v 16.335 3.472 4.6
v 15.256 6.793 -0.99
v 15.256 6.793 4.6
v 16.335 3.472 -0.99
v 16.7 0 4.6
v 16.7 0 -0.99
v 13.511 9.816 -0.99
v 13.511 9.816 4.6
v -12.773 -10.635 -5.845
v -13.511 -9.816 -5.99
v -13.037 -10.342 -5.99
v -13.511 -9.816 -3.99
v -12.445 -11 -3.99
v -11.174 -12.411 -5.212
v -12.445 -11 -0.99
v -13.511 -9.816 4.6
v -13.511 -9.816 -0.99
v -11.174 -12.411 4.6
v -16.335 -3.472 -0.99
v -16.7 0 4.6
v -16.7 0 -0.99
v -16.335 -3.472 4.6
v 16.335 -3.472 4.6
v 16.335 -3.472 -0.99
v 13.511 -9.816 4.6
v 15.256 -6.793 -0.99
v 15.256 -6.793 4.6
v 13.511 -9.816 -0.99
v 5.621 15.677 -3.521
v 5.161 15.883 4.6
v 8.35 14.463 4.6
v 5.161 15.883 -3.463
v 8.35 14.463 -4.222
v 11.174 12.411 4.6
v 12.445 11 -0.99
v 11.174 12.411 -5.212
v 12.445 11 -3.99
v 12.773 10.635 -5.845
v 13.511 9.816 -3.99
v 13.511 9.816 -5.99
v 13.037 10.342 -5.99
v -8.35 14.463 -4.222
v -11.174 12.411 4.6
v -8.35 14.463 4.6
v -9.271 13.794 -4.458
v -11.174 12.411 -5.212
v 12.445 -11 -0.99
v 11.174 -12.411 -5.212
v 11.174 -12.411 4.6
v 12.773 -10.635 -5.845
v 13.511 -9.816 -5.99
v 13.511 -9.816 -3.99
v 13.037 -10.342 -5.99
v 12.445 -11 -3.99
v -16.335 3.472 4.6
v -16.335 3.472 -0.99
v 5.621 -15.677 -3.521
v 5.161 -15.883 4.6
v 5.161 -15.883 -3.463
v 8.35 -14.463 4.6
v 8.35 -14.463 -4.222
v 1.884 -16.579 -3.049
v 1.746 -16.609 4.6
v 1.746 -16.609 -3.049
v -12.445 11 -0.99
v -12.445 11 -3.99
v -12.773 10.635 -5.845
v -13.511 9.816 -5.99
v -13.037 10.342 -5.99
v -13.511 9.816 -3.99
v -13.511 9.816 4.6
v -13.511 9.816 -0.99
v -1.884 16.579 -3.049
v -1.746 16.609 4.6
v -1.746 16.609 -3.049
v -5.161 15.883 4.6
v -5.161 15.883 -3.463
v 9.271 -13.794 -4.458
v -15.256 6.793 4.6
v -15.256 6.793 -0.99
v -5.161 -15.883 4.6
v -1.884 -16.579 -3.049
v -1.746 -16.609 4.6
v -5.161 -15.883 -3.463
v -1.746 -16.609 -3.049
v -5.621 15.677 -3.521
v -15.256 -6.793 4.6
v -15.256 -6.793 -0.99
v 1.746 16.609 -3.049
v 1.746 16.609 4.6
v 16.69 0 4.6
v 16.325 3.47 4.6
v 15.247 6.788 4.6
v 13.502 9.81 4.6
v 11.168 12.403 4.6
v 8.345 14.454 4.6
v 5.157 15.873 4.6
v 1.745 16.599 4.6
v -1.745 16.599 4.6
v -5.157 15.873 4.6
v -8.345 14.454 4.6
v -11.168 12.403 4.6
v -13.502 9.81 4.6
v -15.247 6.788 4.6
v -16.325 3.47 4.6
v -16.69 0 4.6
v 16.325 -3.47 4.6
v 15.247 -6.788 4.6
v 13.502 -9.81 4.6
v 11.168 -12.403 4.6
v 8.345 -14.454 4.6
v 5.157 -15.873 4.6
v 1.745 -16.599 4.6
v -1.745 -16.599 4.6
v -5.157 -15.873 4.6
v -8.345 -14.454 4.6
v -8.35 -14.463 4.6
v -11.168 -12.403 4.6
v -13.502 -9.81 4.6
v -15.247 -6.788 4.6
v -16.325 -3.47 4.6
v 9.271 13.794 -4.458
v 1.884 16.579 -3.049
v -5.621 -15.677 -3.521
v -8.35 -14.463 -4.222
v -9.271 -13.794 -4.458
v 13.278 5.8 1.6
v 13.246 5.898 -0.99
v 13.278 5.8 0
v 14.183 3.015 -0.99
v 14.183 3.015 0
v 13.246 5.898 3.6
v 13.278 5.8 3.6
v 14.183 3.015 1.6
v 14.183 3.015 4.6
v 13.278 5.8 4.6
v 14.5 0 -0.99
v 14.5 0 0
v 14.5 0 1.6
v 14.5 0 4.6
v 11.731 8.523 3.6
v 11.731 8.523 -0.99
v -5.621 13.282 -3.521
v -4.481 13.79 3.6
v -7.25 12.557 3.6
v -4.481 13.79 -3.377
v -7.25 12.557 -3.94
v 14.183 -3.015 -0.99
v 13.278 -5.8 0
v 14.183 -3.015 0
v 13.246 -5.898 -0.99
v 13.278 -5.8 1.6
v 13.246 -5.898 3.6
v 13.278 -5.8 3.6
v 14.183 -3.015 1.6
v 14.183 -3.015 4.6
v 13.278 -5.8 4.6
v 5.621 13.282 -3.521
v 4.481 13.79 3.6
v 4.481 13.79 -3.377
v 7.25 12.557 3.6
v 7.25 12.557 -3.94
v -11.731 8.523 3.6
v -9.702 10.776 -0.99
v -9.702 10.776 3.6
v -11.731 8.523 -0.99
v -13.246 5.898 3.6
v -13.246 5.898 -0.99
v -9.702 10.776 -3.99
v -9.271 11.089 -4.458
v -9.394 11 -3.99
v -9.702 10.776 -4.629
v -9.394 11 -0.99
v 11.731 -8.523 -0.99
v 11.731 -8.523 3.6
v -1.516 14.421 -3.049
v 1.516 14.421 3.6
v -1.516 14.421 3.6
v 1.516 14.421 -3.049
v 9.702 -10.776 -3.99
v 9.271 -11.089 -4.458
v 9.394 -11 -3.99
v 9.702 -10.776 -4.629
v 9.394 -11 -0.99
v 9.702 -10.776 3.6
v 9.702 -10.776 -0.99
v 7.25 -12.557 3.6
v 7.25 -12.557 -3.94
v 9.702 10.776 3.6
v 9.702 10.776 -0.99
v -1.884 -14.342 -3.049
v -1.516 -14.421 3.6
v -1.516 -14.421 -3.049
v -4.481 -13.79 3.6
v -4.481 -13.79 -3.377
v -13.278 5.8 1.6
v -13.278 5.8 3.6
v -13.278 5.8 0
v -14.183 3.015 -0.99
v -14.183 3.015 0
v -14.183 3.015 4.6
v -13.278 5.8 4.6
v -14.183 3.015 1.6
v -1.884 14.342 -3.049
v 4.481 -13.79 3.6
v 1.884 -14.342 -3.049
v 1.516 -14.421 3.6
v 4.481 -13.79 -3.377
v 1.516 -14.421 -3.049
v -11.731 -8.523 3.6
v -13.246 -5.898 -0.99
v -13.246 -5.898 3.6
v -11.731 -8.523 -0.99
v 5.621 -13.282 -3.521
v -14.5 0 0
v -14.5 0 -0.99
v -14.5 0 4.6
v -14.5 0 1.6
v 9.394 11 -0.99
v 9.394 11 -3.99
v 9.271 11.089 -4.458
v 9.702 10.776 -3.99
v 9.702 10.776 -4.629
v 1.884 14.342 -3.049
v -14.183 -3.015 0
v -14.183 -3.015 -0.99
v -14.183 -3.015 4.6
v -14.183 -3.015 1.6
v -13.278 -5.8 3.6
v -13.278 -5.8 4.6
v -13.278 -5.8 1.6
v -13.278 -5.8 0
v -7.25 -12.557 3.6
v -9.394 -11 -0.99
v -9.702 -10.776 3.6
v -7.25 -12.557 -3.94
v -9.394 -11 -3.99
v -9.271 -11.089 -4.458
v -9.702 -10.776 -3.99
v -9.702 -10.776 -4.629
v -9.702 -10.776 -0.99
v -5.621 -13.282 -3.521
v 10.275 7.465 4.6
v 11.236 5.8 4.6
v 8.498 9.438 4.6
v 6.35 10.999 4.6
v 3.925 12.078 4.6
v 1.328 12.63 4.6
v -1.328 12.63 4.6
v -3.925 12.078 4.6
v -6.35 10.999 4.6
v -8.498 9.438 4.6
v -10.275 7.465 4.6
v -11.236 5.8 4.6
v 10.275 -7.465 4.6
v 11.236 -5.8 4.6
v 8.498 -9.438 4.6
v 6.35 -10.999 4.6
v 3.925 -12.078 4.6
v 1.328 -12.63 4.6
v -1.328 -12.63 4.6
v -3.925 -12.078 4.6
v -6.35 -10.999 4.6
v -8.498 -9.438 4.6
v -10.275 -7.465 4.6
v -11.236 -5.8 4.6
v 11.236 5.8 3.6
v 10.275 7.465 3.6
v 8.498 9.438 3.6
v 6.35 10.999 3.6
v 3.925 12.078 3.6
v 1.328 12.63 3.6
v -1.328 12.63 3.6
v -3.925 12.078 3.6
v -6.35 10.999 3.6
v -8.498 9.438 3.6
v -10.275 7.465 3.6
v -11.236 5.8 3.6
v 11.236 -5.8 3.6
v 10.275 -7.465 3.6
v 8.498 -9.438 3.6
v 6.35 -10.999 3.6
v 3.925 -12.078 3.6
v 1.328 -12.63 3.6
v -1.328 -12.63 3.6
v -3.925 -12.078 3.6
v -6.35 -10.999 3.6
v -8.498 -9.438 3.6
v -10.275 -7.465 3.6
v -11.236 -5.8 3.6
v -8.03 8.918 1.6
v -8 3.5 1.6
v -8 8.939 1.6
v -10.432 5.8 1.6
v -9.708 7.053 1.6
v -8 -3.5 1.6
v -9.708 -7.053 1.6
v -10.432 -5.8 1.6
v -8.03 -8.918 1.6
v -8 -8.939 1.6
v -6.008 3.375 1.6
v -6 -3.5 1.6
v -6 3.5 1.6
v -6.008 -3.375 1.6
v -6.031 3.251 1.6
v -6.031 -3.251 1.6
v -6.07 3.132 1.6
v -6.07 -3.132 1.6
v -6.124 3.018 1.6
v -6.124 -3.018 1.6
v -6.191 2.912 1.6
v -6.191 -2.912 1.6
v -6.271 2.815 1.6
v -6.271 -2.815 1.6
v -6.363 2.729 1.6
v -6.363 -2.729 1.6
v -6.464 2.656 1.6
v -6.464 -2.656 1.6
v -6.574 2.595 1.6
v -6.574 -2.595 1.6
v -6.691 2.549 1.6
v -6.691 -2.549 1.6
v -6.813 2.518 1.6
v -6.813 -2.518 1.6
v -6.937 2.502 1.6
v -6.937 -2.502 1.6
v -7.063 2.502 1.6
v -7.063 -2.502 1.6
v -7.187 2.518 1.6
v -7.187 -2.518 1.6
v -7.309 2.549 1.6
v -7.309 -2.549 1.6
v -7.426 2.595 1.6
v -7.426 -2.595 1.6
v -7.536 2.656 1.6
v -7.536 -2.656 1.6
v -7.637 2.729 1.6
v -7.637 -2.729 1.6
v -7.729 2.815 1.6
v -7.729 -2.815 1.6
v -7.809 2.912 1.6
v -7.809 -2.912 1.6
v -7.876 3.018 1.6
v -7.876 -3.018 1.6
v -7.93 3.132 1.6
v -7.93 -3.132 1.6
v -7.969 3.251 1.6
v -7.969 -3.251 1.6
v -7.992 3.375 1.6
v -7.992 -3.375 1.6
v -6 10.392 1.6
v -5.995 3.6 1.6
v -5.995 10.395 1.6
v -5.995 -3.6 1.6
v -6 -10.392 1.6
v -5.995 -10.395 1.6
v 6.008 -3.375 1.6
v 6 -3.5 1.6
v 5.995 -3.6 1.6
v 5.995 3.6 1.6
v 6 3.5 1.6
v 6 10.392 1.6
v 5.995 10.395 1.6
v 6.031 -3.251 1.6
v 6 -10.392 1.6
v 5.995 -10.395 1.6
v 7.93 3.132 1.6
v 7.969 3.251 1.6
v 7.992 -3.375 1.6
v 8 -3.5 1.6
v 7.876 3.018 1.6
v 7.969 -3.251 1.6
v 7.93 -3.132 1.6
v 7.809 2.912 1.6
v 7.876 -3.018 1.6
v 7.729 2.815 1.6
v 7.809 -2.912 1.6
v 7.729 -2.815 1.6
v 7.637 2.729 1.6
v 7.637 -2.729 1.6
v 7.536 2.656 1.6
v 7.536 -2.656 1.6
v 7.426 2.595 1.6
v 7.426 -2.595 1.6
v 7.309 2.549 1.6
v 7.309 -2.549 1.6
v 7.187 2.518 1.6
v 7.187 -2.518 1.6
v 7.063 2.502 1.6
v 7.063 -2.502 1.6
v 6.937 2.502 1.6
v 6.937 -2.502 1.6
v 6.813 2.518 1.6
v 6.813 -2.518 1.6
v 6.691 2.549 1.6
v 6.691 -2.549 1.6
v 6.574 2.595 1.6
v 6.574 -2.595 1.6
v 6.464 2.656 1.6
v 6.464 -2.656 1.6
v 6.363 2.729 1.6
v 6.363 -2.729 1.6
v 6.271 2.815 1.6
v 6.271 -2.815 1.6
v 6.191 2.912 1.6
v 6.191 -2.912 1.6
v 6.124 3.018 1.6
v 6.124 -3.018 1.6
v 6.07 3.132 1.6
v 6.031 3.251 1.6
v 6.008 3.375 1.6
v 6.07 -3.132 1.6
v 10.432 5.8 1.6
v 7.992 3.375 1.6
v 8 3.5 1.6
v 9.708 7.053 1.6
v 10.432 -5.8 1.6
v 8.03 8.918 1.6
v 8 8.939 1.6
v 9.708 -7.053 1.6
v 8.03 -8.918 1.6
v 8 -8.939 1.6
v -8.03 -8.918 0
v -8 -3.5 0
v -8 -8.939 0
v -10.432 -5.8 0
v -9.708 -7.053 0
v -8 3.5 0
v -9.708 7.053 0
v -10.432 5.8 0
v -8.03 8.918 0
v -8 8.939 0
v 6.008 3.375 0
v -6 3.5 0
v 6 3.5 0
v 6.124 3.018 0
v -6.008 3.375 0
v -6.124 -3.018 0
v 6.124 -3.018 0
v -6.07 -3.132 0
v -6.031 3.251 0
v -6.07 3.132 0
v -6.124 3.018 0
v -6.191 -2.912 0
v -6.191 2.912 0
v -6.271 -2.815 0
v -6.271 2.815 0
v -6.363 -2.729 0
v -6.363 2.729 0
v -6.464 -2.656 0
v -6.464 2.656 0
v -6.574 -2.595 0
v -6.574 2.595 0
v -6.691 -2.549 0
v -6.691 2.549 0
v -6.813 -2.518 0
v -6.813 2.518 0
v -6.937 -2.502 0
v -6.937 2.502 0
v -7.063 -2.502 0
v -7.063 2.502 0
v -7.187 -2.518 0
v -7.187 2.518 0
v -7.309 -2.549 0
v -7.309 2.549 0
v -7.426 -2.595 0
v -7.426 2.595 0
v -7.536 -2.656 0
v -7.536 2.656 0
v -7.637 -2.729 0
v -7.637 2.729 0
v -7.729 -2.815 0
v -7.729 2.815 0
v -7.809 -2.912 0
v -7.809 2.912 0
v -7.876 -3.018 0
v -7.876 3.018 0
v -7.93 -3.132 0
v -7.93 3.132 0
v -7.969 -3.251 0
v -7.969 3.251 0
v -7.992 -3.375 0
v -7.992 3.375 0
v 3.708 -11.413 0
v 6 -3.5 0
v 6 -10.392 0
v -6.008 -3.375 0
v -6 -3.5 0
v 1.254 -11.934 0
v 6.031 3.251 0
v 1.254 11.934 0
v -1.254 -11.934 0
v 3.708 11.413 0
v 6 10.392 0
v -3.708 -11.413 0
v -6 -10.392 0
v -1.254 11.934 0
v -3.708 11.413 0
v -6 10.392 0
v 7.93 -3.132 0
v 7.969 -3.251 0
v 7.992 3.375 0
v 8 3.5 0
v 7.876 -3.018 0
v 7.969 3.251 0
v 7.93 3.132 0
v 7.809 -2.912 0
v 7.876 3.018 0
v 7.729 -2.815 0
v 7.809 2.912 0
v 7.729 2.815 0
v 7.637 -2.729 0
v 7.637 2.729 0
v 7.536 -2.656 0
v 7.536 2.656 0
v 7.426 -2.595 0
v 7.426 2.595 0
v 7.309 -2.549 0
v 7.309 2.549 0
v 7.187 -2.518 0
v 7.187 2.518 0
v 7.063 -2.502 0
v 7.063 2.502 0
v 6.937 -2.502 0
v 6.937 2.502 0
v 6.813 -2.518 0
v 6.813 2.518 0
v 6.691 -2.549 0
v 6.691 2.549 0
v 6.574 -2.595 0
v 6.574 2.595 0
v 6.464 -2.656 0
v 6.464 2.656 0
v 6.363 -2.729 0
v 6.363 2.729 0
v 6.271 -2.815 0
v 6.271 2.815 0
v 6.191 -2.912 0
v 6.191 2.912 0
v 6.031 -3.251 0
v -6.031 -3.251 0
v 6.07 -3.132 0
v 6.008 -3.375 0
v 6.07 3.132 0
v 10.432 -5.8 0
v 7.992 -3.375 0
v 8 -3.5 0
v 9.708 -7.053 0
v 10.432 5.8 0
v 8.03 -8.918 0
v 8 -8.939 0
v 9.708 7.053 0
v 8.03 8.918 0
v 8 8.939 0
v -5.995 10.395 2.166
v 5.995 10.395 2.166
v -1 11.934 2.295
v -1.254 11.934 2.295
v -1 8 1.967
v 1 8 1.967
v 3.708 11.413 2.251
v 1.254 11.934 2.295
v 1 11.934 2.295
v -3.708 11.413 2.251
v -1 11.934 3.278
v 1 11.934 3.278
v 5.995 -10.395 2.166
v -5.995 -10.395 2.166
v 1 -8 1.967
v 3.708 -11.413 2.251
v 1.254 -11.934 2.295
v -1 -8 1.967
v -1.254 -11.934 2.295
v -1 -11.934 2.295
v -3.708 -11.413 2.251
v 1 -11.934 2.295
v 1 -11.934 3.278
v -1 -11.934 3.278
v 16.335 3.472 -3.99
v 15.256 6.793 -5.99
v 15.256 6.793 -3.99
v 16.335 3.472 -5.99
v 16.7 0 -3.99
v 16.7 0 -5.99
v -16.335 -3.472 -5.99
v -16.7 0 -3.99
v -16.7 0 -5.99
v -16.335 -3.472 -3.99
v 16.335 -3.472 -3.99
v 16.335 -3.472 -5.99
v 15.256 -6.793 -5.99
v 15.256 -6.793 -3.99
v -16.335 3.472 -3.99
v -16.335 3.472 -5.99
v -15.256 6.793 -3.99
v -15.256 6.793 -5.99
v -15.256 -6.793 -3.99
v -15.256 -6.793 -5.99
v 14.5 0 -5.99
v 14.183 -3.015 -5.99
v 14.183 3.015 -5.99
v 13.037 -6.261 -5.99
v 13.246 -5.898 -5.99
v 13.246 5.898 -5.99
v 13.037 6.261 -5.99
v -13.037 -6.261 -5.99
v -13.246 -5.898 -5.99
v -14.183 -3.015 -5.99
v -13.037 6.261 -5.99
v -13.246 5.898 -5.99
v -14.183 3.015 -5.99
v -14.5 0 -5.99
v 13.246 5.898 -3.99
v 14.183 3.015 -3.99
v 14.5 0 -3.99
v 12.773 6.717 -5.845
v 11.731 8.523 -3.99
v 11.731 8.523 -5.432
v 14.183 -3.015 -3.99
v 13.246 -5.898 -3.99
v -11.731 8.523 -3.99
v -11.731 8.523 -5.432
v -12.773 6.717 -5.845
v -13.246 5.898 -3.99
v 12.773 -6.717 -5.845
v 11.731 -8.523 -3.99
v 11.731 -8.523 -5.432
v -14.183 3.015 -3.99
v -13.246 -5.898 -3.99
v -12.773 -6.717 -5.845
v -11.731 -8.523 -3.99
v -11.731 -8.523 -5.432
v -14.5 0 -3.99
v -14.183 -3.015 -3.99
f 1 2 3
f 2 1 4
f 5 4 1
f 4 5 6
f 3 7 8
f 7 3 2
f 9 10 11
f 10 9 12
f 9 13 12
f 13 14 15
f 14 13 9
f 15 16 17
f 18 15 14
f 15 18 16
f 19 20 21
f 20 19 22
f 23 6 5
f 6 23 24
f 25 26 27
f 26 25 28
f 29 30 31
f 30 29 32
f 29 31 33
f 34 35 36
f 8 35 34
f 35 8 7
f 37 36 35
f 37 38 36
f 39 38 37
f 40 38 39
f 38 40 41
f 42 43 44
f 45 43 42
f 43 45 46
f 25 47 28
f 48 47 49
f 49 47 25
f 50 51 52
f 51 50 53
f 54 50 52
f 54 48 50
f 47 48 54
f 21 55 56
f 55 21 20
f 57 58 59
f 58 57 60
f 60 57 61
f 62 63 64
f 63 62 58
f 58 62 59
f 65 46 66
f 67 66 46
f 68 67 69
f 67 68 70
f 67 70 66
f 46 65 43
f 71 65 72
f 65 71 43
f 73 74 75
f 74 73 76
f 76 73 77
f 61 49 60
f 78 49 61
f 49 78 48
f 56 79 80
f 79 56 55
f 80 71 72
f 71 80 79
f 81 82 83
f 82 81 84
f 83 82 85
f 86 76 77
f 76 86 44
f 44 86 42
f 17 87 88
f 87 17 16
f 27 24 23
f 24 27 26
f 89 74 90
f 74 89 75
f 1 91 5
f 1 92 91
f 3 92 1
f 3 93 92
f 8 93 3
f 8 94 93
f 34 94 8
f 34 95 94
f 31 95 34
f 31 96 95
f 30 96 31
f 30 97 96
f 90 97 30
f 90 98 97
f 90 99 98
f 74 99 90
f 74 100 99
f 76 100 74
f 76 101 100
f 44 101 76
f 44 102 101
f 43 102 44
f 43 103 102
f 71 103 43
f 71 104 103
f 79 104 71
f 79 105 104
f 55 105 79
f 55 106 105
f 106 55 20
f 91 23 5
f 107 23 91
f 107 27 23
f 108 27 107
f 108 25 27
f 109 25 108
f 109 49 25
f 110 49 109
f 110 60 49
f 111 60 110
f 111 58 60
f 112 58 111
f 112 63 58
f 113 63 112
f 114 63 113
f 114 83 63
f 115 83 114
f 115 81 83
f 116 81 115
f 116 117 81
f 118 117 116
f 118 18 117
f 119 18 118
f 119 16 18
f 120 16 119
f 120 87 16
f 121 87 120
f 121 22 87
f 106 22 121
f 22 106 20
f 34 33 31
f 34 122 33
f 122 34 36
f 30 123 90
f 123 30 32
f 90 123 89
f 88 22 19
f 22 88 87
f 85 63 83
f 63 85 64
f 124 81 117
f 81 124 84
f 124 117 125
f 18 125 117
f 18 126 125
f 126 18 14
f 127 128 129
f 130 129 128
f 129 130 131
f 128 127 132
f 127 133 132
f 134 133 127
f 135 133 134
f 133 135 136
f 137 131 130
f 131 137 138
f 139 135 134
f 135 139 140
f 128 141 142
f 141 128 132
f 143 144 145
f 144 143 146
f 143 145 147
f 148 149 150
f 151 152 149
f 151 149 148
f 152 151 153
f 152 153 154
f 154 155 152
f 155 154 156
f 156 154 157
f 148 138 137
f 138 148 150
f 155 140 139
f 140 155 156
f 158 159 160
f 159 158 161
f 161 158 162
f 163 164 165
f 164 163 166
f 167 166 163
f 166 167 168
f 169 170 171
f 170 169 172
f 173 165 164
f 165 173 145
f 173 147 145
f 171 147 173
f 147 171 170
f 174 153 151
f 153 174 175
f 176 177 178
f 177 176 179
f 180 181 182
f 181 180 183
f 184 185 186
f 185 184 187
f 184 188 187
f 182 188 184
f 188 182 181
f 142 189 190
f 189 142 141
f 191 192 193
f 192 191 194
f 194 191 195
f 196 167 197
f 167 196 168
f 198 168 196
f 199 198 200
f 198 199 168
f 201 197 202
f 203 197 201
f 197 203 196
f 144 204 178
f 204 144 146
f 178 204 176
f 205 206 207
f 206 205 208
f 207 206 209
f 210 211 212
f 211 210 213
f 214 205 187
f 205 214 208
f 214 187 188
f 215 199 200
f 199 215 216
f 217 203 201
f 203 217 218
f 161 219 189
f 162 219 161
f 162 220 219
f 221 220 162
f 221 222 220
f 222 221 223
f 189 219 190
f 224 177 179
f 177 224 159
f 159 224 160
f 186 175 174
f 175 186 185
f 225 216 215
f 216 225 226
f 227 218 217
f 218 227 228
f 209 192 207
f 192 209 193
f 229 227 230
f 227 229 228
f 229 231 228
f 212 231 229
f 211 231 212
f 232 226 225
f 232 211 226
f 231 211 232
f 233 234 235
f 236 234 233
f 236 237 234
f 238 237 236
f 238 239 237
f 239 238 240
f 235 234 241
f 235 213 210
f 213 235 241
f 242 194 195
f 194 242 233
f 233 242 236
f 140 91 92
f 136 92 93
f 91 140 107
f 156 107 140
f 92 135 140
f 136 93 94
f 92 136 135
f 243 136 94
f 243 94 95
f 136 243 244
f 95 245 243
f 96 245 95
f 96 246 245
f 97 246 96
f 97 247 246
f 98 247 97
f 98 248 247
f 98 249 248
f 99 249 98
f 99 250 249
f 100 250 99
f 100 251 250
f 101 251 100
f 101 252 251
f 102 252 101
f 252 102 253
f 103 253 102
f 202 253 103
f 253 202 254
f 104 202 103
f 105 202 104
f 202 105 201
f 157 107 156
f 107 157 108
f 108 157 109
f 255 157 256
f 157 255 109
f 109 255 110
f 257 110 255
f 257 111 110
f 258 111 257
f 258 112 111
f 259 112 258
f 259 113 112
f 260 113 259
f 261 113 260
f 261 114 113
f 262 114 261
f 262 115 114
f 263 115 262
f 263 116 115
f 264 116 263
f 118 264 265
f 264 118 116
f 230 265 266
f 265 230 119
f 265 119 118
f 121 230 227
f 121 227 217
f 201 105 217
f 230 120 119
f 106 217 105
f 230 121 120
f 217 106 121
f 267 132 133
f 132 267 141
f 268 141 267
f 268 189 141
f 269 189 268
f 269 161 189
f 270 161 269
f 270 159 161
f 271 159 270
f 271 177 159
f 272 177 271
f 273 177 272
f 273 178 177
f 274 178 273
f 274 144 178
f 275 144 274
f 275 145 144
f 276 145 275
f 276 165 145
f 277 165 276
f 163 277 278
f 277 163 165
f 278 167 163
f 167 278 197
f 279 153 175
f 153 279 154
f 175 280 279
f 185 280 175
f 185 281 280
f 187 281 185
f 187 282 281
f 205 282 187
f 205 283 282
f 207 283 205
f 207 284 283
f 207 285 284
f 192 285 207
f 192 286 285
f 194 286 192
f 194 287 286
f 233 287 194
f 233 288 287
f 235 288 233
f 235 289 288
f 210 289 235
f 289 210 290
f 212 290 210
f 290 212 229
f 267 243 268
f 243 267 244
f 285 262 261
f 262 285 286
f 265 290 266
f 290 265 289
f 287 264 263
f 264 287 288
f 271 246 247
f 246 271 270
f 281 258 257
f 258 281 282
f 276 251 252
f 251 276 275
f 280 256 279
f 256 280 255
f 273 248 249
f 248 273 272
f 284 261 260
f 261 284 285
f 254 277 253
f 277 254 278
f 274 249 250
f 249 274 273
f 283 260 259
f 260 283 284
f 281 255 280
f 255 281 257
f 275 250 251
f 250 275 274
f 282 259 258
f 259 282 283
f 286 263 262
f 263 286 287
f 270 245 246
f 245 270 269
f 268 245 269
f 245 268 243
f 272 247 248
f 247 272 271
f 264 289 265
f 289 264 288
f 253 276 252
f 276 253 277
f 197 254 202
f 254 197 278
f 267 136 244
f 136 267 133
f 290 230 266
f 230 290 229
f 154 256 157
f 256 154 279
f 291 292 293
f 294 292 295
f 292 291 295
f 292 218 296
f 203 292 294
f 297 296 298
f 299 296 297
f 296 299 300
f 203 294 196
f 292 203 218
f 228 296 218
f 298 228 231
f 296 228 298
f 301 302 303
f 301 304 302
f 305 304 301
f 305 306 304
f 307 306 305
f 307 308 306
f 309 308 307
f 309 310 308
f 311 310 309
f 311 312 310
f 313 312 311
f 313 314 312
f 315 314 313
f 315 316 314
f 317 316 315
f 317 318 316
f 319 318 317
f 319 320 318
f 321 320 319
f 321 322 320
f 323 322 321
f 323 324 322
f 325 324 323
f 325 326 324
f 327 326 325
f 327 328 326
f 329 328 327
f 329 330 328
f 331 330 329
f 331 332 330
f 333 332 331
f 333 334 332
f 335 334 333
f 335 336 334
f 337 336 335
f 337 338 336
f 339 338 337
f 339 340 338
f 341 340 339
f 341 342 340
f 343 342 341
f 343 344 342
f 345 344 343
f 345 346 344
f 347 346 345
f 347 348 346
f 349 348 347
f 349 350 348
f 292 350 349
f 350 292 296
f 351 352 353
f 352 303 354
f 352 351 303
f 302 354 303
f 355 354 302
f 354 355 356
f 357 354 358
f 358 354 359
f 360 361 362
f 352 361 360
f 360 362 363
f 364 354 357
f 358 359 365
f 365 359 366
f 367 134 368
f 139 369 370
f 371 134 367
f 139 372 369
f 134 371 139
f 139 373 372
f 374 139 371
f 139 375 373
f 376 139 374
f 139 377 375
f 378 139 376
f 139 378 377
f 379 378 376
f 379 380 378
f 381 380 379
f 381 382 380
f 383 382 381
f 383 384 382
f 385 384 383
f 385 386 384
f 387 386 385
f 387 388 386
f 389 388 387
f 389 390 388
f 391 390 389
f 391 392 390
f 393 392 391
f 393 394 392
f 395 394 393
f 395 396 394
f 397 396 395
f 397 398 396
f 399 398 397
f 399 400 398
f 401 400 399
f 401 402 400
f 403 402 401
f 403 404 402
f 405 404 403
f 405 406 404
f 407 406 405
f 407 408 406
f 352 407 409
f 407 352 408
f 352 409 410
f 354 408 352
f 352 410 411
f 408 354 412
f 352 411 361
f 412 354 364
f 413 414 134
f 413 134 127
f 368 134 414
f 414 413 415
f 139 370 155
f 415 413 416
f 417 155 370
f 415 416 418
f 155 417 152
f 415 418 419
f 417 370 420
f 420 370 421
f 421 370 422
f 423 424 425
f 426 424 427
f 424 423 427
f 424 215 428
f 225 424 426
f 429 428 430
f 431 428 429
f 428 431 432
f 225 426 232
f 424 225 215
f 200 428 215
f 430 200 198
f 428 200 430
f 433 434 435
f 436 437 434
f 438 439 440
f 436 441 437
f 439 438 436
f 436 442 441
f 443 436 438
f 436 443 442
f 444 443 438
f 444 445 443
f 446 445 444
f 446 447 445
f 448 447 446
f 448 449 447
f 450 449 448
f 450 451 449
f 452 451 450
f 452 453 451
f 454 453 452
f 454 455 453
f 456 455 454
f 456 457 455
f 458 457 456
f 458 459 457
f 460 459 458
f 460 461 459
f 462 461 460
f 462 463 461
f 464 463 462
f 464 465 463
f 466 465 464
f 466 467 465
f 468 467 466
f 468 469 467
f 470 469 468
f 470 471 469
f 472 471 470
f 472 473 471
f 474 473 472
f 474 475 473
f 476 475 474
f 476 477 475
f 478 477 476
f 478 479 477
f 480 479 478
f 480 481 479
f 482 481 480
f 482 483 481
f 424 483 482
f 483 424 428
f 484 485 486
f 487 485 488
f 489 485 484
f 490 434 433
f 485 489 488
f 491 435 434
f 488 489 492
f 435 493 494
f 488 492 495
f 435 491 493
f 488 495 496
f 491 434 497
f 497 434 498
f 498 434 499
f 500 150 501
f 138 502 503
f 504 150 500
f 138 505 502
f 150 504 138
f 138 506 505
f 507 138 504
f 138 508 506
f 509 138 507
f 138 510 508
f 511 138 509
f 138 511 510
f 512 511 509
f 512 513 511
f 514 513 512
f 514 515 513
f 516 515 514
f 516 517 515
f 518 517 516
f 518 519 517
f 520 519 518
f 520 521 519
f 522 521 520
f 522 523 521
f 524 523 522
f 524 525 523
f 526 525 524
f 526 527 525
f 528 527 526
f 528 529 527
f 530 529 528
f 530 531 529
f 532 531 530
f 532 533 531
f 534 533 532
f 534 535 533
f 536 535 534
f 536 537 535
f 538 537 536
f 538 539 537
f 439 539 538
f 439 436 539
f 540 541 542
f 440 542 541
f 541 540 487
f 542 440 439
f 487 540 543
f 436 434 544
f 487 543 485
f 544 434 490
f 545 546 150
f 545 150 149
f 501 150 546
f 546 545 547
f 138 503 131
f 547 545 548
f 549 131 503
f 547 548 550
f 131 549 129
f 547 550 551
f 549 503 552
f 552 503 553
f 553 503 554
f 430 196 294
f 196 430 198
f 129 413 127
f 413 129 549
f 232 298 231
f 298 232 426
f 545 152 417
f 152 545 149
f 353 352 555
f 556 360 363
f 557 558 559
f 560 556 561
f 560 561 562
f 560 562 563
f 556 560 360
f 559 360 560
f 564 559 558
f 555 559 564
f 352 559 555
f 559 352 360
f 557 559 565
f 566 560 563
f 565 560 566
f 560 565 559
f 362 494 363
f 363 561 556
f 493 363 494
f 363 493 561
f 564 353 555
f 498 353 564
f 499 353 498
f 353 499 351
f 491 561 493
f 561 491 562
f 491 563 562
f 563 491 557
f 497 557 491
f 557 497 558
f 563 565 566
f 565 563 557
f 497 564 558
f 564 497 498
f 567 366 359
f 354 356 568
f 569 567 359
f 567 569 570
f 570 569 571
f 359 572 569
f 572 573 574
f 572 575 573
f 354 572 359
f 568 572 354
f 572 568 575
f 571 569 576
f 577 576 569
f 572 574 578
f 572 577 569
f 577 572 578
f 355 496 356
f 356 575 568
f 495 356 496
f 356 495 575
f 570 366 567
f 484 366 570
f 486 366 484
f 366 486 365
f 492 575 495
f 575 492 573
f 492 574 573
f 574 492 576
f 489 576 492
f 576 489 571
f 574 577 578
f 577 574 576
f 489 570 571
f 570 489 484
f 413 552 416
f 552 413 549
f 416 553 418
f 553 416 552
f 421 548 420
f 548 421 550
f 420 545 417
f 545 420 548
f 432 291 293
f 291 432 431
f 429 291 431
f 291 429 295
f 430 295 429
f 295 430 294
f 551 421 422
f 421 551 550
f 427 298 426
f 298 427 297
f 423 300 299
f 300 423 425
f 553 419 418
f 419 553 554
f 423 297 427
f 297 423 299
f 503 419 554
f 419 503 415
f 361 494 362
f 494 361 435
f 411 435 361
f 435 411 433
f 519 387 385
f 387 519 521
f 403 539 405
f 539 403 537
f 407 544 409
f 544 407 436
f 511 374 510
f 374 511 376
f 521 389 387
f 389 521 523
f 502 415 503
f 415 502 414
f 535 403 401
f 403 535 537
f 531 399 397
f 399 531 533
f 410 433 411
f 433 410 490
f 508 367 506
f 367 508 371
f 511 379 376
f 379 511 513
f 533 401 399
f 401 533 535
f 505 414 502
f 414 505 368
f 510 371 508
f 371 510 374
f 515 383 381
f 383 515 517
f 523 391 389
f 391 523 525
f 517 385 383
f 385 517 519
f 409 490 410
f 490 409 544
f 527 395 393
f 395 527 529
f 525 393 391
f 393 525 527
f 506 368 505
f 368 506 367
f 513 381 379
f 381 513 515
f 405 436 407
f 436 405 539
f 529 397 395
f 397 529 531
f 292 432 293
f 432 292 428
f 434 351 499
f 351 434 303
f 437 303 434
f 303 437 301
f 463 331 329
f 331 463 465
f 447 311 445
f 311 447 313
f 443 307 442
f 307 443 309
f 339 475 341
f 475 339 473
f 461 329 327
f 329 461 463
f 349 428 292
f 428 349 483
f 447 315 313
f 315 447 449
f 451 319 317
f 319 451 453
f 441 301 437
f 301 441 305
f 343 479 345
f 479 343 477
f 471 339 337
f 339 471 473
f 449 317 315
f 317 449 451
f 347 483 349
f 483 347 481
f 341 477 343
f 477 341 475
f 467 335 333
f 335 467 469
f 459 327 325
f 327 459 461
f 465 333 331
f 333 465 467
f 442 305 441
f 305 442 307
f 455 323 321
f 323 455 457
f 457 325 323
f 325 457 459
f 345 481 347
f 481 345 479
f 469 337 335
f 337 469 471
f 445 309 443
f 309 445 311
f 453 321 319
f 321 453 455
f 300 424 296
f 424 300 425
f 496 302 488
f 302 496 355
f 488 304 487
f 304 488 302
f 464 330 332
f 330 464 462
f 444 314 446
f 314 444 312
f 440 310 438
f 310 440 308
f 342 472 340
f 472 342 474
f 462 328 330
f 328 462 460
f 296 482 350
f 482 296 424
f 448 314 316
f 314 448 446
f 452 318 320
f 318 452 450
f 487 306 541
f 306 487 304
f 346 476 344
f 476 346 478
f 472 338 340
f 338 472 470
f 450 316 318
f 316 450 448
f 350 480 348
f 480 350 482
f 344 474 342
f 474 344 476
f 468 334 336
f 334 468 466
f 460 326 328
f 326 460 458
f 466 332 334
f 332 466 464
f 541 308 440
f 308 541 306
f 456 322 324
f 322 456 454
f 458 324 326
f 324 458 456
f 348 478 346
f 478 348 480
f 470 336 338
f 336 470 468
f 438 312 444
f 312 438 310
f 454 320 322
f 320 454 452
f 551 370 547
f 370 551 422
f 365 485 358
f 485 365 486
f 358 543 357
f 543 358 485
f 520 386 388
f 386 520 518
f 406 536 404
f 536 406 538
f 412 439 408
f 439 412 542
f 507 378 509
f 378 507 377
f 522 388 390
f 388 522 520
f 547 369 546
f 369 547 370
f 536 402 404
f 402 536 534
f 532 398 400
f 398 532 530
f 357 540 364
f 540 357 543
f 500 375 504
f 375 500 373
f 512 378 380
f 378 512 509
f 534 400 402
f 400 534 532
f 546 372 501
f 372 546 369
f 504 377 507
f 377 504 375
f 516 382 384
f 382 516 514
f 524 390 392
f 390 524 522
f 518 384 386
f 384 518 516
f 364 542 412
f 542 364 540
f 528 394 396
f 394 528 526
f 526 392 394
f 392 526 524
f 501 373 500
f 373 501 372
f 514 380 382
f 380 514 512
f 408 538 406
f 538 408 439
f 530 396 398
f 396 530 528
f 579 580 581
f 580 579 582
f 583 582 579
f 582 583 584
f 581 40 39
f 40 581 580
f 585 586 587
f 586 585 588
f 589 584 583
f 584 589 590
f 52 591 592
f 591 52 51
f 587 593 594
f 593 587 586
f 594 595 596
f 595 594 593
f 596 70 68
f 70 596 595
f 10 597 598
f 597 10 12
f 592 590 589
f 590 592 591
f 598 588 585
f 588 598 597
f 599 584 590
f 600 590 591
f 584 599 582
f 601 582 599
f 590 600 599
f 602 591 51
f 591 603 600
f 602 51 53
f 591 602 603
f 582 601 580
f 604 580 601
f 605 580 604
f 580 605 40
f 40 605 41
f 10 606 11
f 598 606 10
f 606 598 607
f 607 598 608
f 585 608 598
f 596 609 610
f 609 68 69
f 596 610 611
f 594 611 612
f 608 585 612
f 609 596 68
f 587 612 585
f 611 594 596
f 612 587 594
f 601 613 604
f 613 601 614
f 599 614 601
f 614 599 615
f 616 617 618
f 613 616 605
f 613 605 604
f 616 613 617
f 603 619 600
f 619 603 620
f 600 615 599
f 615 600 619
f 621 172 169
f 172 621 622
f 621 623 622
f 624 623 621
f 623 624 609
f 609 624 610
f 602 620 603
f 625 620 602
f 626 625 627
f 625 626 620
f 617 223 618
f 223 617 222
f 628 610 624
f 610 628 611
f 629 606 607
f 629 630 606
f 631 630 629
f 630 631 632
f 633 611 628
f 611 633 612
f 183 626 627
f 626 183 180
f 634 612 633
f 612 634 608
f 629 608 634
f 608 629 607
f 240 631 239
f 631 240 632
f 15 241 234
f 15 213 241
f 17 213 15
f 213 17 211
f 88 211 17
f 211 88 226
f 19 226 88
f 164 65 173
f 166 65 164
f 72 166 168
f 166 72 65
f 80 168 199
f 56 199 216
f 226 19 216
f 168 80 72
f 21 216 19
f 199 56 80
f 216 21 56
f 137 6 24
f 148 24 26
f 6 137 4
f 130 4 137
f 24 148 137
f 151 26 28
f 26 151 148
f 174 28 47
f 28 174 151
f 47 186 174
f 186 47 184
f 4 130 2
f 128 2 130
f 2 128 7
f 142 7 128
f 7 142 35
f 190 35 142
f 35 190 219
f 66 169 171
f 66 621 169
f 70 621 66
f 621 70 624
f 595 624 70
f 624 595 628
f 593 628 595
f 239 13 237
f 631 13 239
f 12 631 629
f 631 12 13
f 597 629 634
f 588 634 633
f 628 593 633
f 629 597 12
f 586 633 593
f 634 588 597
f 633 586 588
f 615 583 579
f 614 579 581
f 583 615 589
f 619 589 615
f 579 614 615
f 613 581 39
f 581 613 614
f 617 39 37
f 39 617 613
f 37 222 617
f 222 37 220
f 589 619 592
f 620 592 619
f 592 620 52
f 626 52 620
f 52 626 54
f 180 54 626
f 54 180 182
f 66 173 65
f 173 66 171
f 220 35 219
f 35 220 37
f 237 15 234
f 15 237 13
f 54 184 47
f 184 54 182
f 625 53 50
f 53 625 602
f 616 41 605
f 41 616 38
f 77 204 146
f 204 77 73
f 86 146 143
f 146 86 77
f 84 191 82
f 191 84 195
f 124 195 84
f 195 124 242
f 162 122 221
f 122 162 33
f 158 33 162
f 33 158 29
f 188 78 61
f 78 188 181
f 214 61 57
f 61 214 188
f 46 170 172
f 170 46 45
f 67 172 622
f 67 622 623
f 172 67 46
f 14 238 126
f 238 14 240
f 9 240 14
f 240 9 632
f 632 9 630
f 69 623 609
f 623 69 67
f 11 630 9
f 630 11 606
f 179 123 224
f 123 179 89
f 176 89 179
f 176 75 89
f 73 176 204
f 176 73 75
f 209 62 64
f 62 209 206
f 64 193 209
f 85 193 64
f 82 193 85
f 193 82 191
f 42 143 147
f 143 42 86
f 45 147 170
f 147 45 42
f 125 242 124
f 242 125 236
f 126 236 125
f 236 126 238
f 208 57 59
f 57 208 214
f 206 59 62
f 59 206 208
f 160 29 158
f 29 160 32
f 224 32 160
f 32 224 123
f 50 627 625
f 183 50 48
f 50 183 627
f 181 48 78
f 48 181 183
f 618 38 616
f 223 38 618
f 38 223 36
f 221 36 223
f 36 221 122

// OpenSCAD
/*
 * Garmin Edge 800 velcro holder
 *
 * (c) krist10an 2012
 *
 */

// ---- Configuration ----

// outer body
outer_radius = 33.4/2;
inner_radius = 29/2;

// flange
flange_inner_radius = 25.4/2;
flange_height = 1;

// flange opening
fo_radius = inner_radius;
fo_height = 1.6;
fo_width = 11.6;


// spring load
springload_dist_from_top = 3;

springload_height = 1.6;
springload_radius = 24/2;
springload_width = fo_width;

// spring load slots
slot_width =  2;
slot_length = 10;

slot_distance_x = 12;
slot_distance_y= 5;

// holder
velcro_slot_height = 3;
velcro_slot_width = 22;
velcro_slot_offset = 1;

holder_height = 6;
handlebar_radius = 30/2;


// outer body
top_to_springload = 3;
height = springload_height+top_to_springload;


// Used to ensure overlap between objects
overlap = 0.01;
overlapmul = 1.1;


/* -----
 * Ring
 *
 * or=outer radius
 * ir=inner radius
 * h = height
 */
module ring(or, ir, h, center=false) {
	difference() {
		cylinder(h=h, r=or, center=center);
		if (center == true) {
			echo("centered");
			cylinder(h=h*overlapmul, r=ir, center=center);
		} else {
			translate([0,0,-(h*overlapmul-h)/2]) cylinder(h=h*overlapmul, r=ir, center=center);
		}
	}
}


module flange_opening()
{
	opening_height = height+1;
	// make cube with rounded ends which fits inside inner diameter
	translate( [0,0,opening_height/2]) intersection() {
			cylinder(r=fo_radius, h=opening_height, center=true);
			cube(size=[fo_radius*2, fo_width, opening_height], center=true);
	}

}

module outerbody()
{
	difference() {
		union() {
			// Main ring
			ring(or=outer_radius, ir=inner_radius, h=height, center=false);
			// Flange
			translate([0,0,height-flange_height]) color("red") ring(outer_radius-overlap, flange_inner_radius, h=flange_height, center=false) ;
		}
		flange_opening();
	}
}


module slot()  {
	// main springload slots
	translate([0,slot_width/2,0]) union() {
		translate([slot_width/2 + slot_distance_x/2,
				slot_length/2 + slot_distance_y/2,
				0])
			cube(size=[slot_width, slot_length,
				springload_height+overlap], center=true);

		translate([slot_width/2 + slot_distance_x/2,
				slot_distance_y/2,
				0])
			cylinder(r=slot_width/2,
				h=springload_height+overlap,
				center=true, $fn=50);
	}
}

module triangle2(w, h, b) {
	rotate(a=[90,-90,0])
	linear_extrude(height = w, center = true, convexity = 10, twist = 0)
	polygon(points=[[0,0],[h,0],[0,b]], paths=[[0,1,2]]);
}

module spring() {
	intersection() {
		union() {
			translate([0,springload_radius,0]) rotate([0, 0, 90]) triangle2(slot_distance_x-overlap, 1, springload_radius);
			translate([0,springload_radius,0]) rotate([0, 0, 90]) triangle2(2, 2, springload_radius/2);
		}
		cylinder(r=springload_radius, h=springload_height*100);
	}
}

module springloading()
{
	difference() {
		union() {
			// main springload plate
			intersection() {
				cylinder(r=outer_radius-overlap, h=springload_height);
				translate([0,0,springload_height/2]) cube(size=[outer_radius*2, springload_width, springload_height], center=true);
			}
			cylinder(r=springload_radius, h=springload_height);
			translate([0,0,springload_height-0.3]) rotate([0,0,0]) spring();
			translate([0,0,springload_height-0.3]) rotate([0,0,180]) spring();
		}
		translate([0,0,springload_height/2]) union() {
			rotate([0,0,0]) slot();
			rotate([0,180,0]) slot();
			rotate([0,0,180]) slot();
			rotate([0,180,180]) slot();
		}
	}
}


module holder() {
	difference() {
		// outer body 
		ring(or=outer_radius, ir=inner_radius, h=holder_height, center=false);

		// velcro slot
		translate([0, 0, holder_height - velcro_slot_height/2 - velcro_slot_offset]) rotate([0, 0, 0]) 
				cube(size=[outer_radius*2+overlap, velcro_slot_width, velcro_slot_height], center=true);

		// handlebar curves
		translate([0, 0, -handlebar_radius*2 + holder_height / 2]) rotate([90, 0, 0])
				cylinder(r=handlebar_radius*2, h=outer_radius*2*overlapmul, center=true, $fn=50);
	}
}

module garminedgeholder()
{
	union() {
		outerbody();
		//cylinder(h=0.01, r=outer_radius*2);
		color("green") springloading();
		//translate([0,0,springload_height]) cylinder(h=3, r=outer_radius*2);
		translate([0, 0, -holder_height+overlap]) color("blue") holder();
	}
}

//$fn=100;
echo("Body height");
echo(height);
echo(height+holder_height);

garminedgeholder();
